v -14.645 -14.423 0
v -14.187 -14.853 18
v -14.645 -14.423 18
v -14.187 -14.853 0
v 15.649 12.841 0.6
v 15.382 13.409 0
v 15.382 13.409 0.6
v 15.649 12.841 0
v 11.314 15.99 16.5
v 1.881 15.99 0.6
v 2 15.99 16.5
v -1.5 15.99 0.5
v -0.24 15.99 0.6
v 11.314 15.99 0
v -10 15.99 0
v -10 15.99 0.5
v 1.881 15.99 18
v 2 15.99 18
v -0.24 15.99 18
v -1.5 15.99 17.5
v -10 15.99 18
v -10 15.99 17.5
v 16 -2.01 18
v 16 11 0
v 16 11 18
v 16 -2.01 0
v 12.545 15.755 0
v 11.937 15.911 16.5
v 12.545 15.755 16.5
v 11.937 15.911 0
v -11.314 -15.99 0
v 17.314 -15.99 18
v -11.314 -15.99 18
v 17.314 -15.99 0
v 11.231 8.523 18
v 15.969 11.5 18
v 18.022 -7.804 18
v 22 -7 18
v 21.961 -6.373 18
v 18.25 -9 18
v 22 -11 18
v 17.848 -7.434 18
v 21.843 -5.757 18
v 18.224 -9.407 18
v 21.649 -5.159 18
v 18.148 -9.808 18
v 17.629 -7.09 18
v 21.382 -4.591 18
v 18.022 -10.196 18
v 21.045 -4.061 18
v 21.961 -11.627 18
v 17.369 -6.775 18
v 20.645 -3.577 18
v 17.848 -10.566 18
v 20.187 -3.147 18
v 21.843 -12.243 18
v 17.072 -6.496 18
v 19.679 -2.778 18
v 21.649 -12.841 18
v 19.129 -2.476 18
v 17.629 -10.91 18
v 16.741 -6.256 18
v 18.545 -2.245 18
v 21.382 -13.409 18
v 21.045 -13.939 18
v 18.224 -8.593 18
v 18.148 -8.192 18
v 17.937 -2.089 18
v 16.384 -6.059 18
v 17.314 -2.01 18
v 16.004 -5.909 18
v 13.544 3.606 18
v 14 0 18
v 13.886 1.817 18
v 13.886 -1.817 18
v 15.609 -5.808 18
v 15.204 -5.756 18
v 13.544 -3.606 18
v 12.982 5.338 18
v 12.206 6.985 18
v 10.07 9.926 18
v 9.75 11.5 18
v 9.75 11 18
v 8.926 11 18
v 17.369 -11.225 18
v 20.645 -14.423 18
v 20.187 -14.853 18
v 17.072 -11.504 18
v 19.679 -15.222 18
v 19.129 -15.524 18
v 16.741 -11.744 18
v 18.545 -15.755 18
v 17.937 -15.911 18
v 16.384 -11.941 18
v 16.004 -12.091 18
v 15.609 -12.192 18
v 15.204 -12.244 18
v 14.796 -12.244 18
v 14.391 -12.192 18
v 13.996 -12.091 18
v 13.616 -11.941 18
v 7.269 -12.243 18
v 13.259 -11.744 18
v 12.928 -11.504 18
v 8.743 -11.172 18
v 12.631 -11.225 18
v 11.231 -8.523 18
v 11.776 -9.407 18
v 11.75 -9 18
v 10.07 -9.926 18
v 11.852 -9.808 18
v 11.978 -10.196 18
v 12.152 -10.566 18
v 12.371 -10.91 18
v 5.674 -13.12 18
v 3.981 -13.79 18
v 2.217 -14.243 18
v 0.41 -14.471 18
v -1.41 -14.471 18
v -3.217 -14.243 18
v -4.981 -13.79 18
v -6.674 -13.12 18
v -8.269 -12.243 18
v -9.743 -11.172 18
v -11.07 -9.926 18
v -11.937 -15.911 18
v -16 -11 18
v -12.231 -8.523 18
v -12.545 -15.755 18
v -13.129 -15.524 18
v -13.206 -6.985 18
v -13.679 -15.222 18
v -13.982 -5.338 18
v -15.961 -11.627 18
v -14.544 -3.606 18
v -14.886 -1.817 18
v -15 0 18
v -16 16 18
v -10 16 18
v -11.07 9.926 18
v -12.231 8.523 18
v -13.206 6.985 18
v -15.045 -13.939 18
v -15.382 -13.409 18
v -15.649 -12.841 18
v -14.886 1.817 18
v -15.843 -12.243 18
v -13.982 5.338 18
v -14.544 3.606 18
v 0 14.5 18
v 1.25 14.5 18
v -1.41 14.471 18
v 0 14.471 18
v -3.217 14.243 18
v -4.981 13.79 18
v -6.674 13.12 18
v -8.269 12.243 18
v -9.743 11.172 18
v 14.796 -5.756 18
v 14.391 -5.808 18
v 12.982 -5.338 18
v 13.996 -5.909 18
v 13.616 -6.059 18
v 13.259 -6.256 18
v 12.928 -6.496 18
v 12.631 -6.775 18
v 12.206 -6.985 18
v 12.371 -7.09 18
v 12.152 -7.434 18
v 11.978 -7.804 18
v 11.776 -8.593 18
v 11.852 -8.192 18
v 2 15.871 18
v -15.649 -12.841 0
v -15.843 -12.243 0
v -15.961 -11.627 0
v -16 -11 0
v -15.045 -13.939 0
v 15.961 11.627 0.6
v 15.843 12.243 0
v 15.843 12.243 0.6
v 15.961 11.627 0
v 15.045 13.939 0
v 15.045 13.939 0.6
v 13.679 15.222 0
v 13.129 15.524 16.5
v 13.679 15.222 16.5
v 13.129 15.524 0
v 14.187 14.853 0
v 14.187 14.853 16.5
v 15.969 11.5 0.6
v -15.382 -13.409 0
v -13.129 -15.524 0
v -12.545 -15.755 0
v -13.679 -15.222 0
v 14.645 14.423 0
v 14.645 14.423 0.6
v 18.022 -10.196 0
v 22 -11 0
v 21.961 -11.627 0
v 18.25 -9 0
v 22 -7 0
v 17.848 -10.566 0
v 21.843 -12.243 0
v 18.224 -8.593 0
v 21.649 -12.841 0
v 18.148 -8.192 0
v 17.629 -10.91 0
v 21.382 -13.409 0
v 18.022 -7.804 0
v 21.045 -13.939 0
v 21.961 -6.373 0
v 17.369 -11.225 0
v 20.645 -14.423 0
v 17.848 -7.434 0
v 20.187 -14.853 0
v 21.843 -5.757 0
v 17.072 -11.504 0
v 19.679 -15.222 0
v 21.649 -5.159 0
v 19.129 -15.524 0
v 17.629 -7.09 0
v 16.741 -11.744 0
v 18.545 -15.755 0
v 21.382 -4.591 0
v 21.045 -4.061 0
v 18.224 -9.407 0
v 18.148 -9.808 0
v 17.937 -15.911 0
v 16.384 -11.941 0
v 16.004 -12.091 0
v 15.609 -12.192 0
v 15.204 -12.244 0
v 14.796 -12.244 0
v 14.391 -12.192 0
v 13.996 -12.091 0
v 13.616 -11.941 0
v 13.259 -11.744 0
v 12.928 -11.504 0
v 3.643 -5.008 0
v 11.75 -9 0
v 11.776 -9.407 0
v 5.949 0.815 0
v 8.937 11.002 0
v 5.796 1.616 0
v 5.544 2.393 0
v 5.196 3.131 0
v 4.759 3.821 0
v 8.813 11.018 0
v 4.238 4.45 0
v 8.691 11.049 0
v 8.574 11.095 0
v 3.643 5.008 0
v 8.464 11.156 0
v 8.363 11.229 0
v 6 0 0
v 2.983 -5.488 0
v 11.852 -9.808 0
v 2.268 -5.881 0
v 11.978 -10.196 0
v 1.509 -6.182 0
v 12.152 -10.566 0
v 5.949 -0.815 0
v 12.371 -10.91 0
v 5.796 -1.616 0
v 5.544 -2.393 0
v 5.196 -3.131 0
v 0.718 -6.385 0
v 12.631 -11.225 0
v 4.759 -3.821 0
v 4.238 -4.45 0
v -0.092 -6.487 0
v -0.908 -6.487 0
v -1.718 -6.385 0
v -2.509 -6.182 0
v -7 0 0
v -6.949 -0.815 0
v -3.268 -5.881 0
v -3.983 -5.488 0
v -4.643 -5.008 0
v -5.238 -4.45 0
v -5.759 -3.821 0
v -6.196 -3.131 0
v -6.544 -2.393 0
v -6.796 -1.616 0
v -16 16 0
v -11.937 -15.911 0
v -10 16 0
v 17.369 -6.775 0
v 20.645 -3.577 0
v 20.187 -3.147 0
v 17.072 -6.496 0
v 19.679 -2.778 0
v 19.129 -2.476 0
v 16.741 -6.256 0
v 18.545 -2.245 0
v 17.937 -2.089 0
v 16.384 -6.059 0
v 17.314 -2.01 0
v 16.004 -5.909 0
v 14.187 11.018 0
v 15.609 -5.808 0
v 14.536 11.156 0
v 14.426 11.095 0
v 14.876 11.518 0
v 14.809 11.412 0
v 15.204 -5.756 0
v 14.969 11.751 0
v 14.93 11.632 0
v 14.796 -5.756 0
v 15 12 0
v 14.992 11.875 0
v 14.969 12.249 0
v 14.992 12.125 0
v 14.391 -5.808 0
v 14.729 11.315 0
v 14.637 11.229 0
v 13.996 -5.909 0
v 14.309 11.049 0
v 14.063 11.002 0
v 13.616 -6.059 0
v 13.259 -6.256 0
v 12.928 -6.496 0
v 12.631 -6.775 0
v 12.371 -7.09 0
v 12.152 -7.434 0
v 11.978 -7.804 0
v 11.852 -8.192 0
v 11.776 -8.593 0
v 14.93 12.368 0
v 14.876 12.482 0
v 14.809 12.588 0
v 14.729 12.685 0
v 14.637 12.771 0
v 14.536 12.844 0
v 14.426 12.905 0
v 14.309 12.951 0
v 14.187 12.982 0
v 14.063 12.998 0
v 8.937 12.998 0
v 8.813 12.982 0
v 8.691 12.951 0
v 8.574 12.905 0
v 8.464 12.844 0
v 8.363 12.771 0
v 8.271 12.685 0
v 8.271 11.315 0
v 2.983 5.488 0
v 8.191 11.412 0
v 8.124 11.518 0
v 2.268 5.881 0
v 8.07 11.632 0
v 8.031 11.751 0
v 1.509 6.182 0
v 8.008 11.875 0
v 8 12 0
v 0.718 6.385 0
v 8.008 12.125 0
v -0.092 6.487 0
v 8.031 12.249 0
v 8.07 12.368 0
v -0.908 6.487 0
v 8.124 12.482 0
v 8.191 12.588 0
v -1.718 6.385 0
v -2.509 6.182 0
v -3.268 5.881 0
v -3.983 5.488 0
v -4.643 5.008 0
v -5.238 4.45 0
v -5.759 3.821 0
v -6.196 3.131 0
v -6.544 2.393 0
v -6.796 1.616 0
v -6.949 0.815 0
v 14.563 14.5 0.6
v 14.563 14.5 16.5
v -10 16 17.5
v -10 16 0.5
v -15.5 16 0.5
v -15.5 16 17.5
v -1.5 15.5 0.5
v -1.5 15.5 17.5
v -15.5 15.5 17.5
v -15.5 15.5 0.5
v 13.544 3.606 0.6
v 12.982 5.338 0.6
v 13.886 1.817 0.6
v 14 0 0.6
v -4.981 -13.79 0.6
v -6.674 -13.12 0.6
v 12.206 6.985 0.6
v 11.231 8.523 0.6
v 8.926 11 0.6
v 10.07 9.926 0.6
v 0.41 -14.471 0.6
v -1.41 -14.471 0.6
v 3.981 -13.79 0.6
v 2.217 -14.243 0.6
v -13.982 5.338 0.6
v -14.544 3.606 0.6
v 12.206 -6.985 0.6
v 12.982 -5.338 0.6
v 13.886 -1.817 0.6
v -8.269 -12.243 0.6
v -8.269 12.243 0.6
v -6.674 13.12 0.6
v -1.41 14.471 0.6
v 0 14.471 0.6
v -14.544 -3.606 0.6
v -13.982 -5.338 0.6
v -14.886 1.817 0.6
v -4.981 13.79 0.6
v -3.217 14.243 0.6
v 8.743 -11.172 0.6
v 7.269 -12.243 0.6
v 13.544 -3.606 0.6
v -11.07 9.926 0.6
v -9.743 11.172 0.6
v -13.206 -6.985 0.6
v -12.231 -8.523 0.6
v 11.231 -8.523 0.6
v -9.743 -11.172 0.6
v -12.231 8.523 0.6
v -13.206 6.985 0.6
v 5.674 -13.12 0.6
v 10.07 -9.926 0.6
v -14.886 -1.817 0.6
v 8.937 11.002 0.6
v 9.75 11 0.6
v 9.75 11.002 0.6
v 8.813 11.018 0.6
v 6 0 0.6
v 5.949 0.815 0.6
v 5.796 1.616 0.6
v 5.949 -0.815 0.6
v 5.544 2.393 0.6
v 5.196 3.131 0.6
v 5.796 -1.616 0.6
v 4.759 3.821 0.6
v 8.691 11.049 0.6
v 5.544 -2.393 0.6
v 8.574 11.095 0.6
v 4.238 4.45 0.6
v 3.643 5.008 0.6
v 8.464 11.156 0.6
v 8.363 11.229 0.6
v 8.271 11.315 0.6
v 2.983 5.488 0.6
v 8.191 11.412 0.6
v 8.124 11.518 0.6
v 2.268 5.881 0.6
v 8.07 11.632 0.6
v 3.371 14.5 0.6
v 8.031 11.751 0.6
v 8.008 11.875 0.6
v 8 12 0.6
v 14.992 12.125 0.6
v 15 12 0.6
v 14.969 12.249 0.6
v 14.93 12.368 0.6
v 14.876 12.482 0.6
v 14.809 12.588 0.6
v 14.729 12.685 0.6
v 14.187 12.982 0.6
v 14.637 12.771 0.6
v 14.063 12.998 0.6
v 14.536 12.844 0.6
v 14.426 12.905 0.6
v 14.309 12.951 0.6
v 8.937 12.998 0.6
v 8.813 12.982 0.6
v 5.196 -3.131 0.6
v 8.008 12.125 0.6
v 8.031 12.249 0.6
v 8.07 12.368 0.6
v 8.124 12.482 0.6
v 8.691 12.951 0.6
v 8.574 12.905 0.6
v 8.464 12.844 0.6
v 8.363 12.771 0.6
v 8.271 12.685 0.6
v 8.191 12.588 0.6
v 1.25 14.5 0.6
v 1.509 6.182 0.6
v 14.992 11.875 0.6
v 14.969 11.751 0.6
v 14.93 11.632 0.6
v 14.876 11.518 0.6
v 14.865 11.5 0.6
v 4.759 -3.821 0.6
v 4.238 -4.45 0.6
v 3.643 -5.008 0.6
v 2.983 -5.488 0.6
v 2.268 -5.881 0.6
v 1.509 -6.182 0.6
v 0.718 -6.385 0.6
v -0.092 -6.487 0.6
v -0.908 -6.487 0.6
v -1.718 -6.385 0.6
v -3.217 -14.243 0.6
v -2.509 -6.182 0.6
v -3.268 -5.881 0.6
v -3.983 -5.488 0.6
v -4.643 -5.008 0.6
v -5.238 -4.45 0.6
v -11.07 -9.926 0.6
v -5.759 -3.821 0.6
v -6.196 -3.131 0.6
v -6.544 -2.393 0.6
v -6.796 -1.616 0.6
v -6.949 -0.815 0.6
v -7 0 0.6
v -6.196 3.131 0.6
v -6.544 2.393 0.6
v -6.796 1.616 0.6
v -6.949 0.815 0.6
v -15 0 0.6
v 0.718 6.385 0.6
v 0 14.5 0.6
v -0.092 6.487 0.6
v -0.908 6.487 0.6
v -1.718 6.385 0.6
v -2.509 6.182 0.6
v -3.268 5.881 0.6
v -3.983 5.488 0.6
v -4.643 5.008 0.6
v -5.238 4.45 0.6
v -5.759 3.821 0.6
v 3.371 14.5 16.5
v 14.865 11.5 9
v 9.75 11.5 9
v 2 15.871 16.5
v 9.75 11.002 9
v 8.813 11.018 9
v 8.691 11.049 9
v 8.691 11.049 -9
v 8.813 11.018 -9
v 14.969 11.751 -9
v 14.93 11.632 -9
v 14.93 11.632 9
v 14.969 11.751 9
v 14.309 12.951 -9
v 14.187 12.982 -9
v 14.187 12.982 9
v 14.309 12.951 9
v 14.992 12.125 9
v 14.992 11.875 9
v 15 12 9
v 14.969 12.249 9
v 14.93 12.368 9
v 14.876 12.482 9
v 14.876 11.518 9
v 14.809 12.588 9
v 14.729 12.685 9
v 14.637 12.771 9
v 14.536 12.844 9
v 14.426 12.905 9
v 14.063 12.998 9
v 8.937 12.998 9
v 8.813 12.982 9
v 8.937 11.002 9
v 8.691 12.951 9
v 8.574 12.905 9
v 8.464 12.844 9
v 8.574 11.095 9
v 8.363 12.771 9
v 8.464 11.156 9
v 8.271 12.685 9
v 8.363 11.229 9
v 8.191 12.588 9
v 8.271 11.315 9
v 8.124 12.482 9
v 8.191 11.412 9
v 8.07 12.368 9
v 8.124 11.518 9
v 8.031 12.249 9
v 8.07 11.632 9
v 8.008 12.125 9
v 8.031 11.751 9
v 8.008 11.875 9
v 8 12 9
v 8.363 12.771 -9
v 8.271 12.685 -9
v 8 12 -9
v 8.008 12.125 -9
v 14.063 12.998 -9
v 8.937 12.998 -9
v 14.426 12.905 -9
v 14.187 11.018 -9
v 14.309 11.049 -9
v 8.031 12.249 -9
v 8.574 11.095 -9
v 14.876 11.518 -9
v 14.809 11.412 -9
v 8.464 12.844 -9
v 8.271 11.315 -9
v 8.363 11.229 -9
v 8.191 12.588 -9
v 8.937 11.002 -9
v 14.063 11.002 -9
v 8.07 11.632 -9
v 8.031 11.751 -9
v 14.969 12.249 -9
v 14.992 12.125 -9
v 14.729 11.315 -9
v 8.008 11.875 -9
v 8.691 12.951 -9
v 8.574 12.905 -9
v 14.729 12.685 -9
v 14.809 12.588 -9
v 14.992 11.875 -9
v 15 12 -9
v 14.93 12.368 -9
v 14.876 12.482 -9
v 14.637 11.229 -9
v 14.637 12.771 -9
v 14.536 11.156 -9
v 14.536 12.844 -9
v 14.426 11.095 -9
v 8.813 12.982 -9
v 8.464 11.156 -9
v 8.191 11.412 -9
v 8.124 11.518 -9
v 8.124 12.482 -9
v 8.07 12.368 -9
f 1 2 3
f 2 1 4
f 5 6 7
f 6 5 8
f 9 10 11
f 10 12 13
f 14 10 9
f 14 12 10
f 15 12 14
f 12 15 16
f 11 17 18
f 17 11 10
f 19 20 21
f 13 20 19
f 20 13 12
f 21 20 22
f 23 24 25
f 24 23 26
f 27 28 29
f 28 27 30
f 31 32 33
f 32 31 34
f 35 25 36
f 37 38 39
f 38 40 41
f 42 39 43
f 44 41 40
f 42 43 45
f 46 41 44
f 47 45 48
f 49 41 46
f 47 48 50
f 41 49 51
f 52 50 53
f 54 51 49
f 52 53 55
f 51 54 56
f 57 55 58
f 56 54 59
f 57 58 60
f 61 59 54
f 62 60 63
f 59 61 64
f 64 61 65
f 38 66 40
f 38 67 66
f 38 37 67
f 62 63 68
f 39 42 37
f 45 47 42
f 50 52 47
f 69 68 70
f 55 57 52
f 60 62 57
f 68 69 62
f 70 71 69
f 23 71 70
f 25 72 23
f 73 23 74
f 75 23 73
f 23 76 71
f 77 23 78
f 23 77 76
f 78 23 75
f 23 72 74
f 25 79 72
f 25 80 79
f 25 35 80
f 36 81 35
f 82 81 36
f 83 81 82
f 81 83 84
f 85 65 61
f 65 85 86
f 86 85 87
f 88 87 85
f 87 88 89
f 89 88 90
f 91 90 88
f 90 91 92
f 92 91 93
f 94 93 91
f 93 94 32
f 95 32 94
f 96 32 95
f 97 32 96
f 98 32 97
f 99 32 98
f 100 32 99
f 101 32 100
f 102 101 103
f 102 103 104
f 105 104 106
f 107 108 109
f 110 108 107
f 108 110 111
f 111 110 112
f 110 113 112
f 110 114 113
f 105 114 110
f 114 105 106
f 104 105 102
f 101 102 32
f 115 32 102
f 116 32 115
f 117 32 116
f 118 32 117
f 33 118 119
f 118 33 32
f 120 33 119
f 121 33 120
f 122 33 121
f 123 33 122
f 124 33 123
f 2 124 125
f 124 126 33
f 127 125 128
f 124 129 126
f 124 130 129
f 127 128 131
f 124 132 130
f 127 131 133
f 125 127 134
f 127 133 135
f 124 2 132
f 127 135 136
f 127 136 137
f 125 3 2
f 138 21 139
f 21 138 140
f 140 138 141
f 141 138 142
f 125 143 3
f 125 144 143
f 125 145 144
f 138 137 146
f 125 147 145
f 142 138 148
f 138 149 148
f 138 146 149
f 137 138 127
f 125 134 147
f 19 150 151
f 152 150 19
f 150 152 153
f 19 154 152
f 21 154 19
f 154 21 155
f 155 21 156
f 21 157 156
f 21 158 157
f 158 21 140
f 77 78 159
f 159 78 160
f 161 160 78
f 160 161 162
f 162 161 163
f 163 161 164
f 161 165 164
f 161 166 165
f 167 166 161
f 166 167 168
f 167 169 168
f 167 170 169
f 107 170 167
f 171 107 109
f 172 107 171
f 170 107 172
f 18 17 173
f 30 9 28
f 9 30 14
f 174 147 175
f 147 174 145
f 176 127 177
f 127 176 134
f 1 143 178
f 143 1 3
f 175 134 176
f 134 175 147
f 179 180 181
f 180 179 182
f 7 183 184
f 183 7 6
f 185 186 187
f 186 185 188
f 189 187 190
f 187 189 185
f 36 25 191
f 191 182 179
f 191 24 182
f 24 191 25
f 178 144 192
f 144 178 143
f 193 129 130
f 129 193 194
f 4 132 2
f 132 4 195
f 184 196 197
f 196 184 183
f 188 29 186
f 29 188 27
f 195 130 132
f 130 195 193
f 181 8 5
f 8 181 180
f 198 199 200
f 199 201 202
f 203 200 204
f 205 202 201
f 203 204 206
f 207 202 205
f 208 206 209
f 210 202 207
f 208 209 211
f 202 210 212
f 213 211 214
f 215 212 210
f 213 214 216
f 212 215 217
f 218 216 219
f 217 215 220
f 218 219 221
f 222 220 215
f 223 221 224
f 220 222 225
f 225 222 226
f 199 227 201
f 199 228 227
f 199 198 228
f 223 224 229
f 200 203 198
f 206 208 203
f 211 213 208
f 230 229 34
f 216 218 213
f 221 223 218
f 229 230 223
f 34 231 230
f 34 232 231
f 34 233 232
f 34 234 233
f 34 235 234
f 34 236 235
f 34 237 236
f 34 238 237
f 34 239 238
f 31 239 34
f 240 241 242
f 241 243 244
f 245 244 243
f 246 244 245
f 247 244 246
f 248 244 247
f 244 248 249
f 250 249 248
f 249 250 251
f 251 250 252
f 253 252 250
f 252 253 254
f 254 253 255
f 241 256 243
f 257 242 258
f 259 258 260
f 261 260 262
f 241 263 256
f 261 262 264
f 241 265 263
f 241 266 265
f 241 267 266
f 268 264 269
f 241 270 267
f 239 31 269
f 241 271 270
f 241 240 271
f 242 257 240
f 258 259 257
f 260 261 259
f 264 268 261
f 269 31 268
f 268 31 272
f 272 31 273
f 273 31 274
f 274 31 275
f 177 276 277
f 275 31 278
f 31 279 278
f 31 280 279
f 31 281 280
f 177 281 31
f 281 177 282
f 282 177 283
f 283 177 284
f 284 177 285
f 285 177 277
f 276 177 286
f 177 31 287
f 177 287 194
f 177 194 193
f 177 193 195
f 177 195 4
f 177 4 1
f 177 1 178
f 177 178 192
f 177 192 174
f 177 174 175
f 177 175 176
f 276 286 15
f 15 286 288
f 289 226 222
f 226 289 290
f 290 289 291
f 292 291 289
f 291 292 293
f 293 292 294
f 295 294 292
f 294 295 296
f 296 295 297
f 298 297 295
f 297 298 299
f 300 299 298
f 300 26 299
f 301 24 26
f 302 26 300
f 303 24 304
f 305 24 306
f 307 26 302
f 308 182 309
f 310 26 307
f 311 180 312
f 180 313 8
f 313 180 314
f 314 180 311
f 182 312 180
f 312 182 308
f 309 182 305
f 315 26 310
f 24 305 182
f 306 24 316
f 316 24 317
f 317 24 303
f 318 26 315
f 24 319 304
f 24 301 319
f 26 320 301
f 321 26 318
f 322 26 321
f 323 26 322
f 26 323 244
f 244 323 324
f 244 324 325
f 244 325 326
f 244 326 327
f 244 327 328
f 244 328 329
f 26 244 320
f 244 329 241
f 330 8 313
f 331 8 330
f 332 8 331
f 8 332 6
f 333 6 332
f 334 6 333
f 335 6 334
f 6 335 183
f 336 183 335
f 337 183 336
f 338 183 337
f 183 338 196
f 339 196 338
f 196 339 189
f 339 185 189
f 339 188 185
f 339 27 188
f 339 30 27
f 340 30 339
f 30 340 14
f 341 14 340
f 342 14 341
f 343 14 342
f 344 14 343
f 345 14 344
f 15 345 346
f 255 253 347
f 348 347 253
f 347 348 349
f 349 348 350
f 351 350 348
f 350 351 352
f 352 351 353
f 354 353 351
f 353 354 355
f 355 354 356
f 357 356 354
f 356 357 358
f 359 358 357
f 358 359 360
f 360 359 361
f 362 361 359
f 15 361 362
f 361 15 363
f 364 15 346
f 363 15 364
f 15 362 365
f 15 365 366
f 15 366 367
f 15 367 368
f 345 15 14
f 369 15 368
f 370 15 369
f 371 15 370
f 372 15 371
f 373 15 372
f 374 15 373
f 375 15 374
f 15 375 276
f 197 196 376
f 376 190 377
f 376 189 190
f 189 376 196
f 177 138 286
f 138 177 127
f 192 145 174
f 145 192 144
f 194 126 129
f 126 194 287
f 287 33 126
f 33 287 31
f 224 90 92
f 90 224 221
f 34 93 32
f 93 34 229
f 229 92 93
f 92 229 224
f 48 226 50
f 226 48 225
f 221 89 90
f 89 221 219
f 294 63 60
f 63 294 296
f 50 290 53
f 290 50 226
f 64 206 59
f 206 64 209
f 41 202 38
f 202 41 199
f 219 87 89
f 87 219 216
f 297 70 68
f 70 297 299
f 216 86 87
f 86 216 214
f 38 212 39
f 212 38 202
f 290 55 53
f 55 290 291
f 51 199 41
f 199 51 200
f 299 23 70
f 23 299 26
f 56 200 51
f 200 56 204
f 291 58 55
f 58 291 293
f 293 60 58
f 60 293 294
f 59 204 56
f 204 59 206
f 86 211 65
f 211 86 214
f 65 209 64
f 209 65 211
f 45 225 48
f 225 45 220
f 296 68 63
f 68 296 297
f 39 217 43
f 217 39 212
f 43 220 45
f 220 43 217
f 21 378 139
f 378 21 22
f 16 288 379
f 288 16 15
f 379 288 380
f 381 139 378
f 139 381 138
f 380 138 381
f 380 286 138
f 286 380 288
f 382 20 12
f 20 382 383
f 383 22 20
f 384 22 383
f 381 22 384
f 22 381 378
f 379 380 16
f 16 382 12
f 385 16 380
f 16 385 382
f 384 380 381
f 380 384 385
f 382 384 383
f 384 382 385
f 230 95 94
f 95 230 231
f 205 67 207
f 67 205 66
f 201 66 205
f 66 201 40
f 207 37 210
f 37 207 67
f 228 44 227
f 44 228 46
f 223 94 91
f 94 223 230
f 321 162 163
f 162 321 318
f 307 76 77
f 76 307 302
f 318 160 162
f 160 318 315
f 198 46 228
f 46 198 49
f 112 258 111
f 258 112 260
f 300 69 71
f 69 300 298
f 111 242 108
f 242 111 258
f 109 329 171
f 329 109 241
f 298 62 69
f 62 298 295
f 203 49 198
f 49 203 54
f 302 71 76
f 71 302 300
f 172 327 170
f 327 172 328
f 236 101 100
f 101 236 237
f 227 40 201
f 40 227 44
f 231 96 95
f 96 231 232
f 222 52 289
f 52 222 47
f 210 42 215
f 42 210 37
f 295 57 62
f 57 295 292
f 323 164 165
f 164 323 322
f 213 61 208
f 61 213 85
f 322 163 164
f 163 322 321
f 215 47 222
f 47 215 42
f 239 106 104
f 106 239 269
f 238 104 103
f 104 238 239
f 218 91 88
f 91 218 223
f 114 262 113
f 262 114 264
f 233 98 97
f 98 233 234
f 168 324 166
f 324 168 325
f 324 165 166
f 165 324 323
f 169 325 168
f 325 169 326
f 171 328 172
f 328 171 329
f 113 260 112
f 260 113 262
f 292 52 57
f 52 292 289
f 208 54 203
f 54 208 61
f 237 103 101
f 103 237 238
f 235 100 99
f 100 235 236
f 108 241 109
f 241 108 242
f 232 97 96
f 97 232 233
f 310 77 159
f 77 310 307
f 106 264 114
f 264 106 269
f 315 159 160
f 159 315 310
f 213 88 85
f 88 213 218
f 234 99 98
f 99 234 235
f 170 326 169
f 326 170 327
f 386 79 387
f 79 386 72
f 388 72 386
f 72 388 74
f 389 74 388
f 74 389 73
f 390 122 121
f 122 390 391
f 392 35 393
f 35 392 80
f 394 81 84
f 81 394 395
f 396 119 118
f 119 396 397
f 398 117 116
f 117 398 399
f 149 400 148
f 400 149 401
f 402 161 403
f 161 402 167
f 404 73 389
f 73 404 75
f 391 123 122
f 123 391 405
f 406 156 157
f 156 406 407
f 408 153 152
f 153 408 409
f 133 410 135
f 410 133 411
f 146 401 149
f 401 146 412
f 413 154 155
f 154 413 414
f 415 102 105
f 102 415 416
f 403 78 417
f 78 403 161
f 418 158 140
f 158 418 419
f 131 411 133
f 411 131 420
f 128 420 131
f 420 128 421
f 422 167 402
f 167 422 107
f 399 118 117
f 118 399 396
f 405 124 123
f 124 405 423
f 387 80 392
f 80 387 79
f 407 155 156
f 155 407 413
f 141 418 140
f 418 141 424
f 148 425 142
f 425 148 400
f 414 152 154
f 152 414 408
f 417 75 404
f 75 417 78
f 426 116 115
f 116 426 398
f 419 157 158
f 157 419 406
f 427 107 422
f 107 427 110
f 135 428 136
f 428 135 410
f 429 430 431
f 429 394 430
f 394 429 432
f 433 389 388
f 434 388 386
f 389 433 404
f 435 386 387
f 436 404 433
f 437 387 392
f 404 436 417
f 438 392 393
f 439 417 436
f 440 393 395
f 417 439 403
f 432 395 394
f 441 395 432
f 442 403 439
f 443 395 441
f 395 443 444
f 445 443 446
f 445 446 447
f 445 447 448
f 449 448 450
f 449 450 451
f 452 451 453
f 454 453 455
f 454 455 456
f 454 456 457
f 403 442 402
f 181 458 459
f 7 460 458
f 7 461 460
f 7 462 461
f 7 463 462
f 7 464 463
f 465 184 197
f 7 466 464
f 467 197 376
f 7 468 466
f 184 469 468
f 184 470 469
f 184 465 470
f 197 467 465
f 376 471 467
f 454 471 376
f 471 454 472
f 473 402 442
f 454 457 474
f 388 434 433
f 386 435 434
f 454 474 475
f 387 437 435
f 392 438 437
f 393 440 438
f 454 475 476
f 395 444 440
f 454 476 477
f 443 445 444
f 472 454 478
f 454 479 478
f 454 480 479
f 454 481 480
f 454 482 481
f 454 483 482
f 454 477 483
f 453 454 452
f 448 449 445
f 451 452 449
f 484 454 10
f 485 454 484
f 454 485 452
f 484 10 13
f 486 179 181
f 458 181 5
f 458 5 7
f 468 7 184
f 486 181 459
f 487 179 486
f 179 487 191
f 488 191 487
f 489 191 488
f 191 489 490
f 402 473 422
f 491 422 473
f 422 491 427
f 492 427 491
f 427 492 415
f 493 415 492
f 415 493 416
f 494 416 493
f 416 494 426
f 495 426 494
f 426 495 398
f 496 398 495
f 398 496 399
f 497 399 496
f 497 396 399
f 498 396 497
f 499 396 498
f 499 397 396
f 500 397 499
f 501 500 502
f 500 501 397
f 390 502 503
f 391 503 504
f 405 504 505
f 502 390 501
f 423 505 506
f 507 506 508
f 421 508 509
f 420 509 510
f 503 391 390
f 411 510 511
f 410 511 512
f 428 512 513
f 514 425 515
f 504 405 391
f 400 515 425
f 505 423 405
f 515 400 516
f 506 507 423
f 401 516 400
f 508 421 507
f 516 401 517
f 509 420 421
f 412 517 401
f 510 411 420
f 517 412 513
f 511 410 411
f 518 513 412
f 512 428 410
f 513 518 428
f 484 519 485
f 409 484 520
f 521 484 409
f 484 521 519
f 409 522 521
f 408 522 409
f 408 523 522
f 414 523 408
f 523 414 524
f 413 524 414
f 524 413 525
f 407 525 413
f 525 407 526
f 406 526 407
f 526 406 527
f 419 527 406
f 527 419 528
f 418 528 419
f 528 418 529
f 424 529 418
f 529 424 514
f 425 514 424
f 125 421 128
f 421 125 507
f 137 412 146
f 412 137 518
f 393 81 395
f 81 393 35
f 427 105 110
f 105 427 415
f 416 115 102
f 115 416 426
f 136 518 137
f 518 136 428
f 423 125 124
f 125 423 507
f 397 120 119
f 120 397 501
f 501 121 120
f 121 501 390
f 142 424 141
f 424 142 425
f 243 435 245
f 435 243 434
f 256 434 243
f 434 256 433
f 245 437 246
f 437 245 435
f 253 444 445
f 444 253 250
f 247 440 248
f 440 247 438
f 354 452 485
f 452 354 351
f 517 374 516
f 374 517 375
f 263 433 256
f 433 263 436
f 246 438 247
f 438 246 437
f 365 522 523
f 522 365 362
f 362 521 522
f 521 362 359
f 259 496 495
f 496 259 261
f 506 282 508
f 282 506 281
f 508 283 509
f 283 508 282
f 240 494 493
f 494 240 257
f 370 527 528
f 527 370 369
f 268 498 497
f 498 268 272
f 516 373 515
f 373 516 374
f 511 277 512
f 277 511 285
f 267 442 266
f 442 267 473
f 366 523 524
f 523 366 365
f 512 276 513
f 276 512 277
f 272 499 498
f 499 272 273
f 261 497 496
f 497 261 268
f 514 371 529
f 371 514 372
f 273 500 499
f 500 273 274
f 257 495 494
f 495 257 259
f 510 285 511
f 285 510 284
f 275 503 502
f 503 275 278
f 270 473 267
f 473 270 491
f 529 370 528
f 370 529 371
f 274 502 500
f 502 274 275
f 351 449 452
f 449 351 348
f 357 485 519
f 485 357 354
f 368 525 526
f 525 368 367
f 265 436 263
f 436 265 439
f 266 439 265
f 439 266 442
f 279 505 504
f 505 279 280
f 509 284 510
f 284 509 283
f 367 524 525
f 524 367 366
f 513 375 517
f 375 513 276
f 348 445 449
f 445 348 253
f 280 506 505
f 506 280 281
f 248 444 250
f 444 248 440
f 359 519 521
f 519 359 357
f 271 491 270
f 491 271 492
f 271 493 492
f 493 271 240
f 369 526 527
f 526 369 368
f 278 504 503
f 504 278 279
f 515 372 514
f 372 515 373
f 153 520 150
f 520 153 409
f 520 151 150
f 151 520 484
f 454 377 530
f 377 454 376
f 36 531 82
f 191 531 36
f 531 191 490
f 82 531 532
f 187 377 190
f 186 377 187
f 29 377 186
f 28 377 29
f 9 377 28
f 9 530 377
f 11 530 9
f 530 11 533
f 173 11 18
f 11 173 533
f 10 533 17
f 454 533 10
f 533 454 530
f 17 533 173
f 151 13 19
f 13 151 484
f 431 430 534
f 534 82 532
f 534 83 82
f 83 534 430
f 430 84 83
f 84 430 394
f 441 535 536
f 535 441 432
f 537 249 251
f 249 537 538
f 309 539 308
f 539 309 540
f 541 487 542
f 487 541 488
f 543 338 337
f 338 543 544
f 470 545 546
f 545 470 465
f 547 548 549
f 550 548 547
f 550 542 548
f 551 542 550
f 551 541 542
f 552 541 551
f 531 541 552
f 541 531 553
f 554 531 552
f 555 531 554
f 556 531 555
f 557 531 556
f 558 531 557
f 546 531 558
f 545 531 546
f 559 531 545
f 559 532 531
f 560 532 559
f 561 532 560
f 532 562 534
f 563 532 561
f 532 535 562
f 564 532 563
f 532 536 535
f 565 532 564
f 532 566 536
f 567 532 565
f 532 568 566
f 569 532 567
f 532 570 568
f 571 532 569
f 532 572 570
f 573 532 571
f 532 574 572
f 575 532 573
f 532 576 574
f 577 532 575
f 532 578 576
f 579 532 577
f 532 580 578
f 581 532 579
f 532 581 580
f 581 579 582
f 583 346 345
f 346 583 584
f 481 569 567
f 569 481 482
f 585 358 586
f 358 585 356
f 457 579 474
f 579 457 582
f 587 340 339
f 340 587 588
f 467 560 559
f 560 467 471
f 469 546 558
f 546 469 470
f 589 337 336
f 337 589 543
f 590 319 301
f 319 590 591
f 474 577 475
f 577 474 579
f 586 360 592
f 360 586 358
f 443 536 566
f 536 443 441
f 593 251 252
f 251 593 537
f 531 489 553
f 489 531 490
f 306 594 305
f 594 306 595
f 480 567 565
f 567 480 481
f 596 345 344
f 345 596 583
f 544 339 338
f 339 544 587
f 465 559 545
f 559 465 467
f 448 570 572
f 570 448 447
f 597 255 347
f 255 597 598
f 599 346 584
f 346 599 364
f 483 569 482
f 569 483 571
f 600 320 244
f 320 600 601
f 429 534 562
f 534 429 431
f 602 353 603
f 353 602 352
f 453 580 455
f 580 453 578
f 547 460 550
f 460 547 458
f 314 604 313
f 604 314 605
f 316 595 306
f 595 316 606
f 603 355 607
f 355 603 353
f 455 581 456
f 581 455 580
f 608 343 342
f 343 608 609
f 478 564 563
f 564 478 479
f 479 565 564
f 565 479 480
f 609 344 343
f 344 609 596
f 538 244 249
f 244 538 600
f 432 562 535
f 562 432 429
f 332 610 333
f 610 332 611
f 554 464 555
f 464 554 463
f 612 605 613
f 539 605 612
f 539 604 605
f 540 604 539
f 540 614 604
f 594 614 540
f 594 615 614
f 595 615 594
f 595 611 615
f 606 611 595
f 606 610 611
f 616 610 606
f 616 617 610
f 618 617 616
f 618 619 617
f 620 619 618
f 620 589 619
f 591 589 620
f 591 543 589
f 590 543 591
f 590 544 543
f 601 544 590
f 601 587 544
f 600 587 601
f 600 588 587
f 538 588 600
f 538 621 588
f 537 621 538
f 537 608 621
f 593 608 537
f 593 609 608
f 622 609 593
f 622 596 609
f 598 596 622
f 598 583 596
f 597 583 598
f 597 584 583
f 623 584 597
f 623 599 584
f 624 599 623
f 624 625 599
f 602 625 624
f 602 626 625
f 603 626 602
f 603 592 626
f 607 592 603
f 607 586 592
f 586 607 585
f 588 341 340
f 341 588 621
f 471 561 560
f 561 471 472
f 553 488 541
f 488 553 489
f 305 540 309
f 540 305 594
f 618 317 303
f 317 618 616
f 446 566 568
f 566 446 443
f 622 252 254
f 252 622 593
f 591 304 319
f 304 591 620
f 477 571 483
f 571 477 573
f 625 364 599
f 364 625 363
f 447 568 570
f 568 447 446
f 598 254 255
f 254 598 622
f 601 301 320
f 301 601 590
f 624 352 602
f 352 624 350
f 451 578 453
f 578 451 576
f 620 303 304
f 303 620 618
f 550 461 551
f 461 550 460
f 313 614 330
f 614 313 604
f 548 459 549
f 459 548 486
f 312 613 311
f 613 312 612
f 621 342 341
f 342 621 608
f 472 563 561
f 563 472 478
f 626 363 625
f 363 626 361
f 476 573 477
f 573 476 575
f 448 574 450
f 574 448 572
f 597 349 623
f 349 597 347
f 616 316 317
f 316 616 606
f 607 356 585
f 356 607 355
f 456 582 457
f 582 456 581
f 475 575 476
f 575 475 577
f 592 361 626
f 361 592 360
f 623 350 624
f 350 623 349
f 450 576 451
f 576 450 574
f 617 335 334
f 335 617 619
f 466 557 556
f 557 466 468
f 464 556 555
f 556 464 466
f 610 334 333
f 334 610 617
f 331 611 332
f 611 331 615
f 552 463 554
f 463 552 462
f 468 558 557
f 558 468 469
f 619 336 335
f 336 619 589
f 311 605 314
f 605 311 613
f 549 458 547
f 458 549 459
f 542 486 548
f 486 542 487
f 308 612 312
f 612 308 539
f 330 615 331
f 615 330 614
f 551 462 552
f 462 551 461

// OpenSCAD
$fn = 50;


union() {
	difference() {
		union() {
			hull() {
				translate(v = [-11.0000000000, 11.0000000000, 0]) {
					cylinder(h = 18, r = 5);
				}
				translate(v = [11.0000000000, 11.0000000000, 0]) {
					cylinder(h = 18, r = 5);
				}
				translate(v = [-11.0000000000, -11.0000000000, 0]) {
					cylinder(h = 18, r = 5);
				}
				translate(v = [11.0000000000, -11.0000000000, 0]) {
					cylinder(h = 18, r = 5);
				}
			}
			translate(v = [7.5000000000, -9.0000000000, 0]) {
				hull() {
					translate(v = [-9.5000000000, 2.0000000000, 0]) {
						cylinder(h = 18, r = 5);
					}
					translate(v = [9.5000000000, 2.0000000000, 0]) {
						cylinder(h = 18, r = 5);
					}
					translate(v = [-9.5000000000, -2.0000000000, 0]) {
						cylinder(h = 18, r = 5);
					}
					translate(v = [9.5000000000, -2.0000000000, 0]) {
						cylinder(h = 18, r = 5);
					}
				}
			}
			translate(v = [-16.0000000000, 10.0000000000, 0]) {
				cube(size = [6, 6, 18]);
			}
		}
		union() {
			translate(v = [-15.5000000000, 15.5000000000, 0.5000000000]) {
				cube(size = [14, 0.5000000000, 17.0000000000]);
			}
			translate(v = [15.0000000000, -9.0000000000, -100.0000000000]) {
				cylinder(h = 200, r = 3.2500000000);
			}
			translate(v = [-0.5000000000, 0.0000000000, 0.6000000000]) {
				cylinder(h = 20.4000000000, r = 14.5000000000);
			}
			translate(v = [-0.5000000000, 0.0000000000, -9.0000000000]) {
				cylinder(h = 18, r = 6.5000000000);
			}
			translate(v = [0.0000000000, 11.5000000000, 0.6000000000]) {
				cube(size = [16.0000000000, 3, 20.4000000000]);
			}
			translate(v = [2.0000000000, 11.5000000000, 16.5000000000]) {
				cube(size = [14.0000000000, 6, 1.5000000000]);
			}
			translate(v = [-3.0000000000, 18.7500000000, 0.6000000000]) {
				rotate(a = [0, 0, -45]) {
					cube(size = [10, 1.5000000000, 20.4000000000]);
				}
			}
			translate(v = [2.2500000000, 11.0000000000, 0.6000000000]) {
				cube(size = [7.5000000000, 2, 17.4000000000]);
			}
		}
	}
	union() {
		translate(v = [11.5000000000, 12, -9.0000000000]) {
			rotate(a = [0, 0, 0]) {
				difference() {
					union() {
						hull() {
							translate(v = [2.5000000000, 0, 0]) {
								cylinder(h = 18, r = 1.0000000000, r1 = 1.0000000000, r2 = 1.0000000000);
							}
							translate(v = [-2.5000000000, 0, 0]) {
								cylinder(h = 18, r = 1.0000000000, r1 = 1.0000000000, r2 = 1.0000000000);
							}
						}
					}
					union();
				}
			}
		}
	}
}
